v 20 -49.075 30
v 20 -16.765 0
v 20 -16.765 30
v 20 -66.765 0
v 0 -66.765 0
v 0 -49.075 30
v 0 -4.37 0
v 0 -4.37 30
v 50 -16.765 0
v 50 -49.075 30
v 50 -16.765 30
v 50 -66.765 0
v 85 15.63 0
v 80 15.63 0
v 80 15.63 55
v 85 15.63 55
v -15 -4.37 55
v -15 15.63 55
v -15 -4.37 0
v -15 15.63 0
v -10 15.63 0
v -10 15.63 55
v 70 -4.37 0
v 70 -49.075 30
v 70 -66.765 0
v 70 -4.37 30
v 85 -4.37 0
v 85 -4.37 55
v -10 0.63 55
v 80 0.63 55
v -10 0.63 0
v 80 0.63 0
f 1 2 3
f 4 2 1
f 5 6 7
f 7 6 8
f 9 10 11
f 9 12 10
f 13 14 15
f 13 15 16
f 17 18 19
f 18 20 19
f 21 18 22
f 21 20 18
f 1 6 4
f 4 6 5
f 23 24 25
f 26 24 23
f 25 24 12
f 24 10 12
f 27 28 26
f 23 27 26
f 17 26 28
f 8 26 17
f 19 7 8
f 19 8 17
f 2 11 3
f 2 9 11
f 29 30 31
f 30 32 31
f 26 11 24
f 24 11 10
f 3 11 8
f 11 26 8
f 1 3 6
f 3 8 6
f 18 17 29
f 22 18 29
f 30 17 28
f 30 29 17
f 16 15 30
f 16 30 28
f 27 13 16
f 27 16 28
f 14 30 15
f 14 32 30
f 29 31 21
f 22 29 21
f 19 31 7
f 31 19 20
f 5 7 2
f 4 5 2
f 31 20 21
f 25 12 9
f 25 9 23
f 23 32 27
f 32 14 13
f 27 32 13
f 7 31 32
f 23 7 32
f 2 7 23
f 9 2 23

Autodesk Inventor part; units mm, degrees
ref_plane "YZ Plane" through (0, 0, 0) normal (1, 0, 0) x (0, 1, 0)
ref_plane "XZ Plane" through (0, 0, 0) normal (0, 1, 0) x (-1, 0, 0)
ref_plane "XY Plane" through (0, 0, 0) normal (0, 0, 1) x (1, 0, 0)
sketch "スケッチ1" plane through (0, 0, 0) normal (1, 0, 0) x (0, 1, 0)
  line L0 (0.6302, 30) -> (-49.0748, 30)
  line L1 (0.6302, 0) -> (-66.7648, 0)
  line L2 (-49.0748, 30) -> (-66.7648, 0)
  line L3 (0.6302, 30) -> (0.6302, 0)
  line L4 (0.6302, 0) -> (0.6302, 30)
  point P0 (0, 0)
  dimension "d0" = 30
  dimension "d30" = 67.395
  dimension "d31" = 49.705
extrude "押し出し1" add sketch "スケッチ1" along normal blind 70
sketch "スケッチ7" plane through (0, -66.7648, 0) normal (0, 0, -1) x (-1, 0, 0)
  line L0 (0, 67.395) -> (-70, 67.395) projected
  line L1 (0, 0) -> (-70, 0) projected
  line L2 (-35, 67.395) -> (-35, 0)
  line L3 (-35, 0) -> (-35, 50)
  line L4 (-50, 50) -> (-20, 50)
  line L5 (-20, 50) -> (-20, 0)
  line L6 (-20, 0) -> (-50, 0)
  line L7 (-50, 0) -> (-50, 50)
  line L8 (-50, 50) -> (-20, 0) construction
  line L9 (-20, 50) -> (-50, 0) construction
  point P0 (0, 66.7648)
  point P1 (-35, 25)
  dimension "d32" = 50
  dimension "d33" = 30
extrude "押し出し4" cut sketch "スケッチ7" against normal blind 50
sketch "スケッチ8" plane through (0, 0.6302, 30) normal (0, 1, 0) x (1, 0, 0)
  line L0 (0, 30) -> (0, 0) projected
  line L1 (0, 0) -> (70, 0) projected
  line L2 (70, 30) -> (70, 0) projected
  line L3 (0, 30) -> (70, 30) projected
  line L4 (-15, 30) -> (85, 30)
  line L5 (85, 30) -> (85, -20)
  line L6 (85, -20) -> (-15, -20)
  line L7 (-15, -20) -> (-15, 30)
  line L8 (-15, 30) -> (85, -20) construction
  line L9 (85, 30) -> (-15, -20) construction
  point P0 (35, 5)
  dimension "d36" = 100
  dimension "d37" = 50
  dimension "d44" = 30
extrude "押し出し5" add sketch "スケッチ8" against normal blind 5 contours L0 L1 L2 L4 L5 L6 L7
sketch "スケッチ9" plane through (-15, 0.6302, 0) normal (0, 1, 0) x (1, 0, 0)
  line L0 (100, -50) -> (0, -50) projected
  line L1 (0, 0) -> (5, 0)
  line L2 (5, 0) -> (5, -50)
  line L3 (5, -50) -> (0, -50)
  line L4 (0, -50) -> (0, 0)
  line L5 (100, 0) -> (95, 0)
  line L6 (95, 0) -> (95, -50)
  line L7 (95, -50) -> (100, -50)
  line L8 (100, -50) -> (100, 0)
  point P0 (15, 0)
  dimension "d40" = 5
  dimension "d41" = 5
extrude "押し出し6" add sketch "スケッチ9" along normal blind 15
sketch "スケッチ10" plane through (-15, -4.3698, 50) normal (0, 0, 1) x (1, 0, 0)
  line L0 (95, 5) -> (5, 5) projected
  line L1 (5, 5) -> (5, 20) projected
  line L2 (0, 20) -> (5, 20) projected
  line L3 (0, 20) -> (0, 0) projected
  line L4 (100, 0) -> (0, 0) projected
  line L5 (100, 20) -> (100, 0) projected
  line L6 (95, 20) -> (100, 20) projected
  line L7 (95, 5) -> (95, 20) projected
  point P0 (15, 4.3698)
extrude "押し出し7" add sketch "スケッチ10" along normal blind 5
properties part number "知能ロボコン発射台支え" material "ABS プラスチック"
